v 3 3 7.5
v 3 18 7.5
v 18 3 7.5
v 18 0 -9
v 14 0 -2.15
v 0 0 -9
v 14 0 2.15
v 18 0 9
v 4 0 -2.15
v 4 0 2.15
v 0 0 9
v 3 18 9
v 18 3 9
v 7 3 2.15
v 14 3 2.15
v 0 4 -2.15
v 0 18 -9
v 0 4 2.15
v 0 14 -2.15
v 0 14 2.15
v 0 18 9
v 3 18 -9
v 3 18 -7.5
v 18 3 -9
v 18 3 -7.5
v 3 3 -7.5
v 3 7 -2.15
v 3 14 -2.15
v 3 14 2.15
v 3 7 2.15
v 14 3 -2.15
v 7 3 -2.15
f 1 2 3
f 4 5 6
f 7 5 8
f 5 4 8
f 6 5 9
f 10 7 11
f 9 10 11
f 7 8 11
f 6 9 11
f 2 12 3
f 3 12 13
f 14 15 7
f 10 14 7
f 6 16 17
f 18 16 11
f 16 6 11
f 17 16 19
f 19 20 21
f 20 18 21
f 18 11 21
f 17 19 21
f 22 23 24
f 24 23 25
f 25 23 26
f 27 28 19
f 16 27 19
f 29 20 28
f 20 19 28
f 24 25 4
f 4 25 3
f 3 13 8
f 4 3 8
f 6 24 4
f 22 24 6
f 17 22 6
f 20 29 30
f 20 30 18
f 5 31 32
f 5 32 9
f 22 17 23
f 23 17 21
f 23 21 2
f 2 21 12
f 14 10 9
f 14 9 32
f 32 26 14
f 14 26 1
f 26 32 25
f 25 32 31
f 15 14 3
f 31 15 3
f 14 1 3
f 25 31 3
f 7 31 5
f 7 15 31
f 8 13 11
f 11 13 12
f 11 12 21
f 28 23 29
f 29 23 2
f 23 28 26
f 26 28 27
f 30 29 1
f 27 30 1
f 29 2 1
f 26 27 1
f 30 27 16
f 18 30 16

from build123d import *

# Parameters (mm, degrees)
BOSS_EXTRUDE1_DEPTH = 9
CUT_EXTRUDE1_DEPTH  = 7.5
CUT_EXTRUDE2_DEPTH  = 2.15


with BuildPart() as part:
    # Sketch1 → Boss-Extrude1 (new, symmetric)
    with BuildSketch(Plane.XY):
        Polygon((0, 0), (0, 18), (3, 18), (18, 3), (18, 0), align=None)
    extrude(amount=BOSS_EXTRUDE1_DEPTH, both=True)

    # Sketch2 → Cut-Extrude1 (cut, symmetric)
    with BuildSketch(Plane.XY):
        Polygon((3, 18), (3, 3), (18, 3), align=None)
    extrude(amount=CUT_EXTRUDE1_DEPTH, both=True, mode=Mode.SUBTRACT)

    # Sketch3 → Cut-Extrude2 (cut, symmetric)
    with BuildSketch(Plane.XY):
        Polygon((0, 14), (3, 14), (3, 7), (0, 4), align=None)
        Polygon((7, 3), (14, 3), (14, 0), (4, 0), align=None)
    extrude(amount=CUT_EXTRUDE2_DEPTH, both=True, mode=Mode.SUBTRACT)


solid = part.part
